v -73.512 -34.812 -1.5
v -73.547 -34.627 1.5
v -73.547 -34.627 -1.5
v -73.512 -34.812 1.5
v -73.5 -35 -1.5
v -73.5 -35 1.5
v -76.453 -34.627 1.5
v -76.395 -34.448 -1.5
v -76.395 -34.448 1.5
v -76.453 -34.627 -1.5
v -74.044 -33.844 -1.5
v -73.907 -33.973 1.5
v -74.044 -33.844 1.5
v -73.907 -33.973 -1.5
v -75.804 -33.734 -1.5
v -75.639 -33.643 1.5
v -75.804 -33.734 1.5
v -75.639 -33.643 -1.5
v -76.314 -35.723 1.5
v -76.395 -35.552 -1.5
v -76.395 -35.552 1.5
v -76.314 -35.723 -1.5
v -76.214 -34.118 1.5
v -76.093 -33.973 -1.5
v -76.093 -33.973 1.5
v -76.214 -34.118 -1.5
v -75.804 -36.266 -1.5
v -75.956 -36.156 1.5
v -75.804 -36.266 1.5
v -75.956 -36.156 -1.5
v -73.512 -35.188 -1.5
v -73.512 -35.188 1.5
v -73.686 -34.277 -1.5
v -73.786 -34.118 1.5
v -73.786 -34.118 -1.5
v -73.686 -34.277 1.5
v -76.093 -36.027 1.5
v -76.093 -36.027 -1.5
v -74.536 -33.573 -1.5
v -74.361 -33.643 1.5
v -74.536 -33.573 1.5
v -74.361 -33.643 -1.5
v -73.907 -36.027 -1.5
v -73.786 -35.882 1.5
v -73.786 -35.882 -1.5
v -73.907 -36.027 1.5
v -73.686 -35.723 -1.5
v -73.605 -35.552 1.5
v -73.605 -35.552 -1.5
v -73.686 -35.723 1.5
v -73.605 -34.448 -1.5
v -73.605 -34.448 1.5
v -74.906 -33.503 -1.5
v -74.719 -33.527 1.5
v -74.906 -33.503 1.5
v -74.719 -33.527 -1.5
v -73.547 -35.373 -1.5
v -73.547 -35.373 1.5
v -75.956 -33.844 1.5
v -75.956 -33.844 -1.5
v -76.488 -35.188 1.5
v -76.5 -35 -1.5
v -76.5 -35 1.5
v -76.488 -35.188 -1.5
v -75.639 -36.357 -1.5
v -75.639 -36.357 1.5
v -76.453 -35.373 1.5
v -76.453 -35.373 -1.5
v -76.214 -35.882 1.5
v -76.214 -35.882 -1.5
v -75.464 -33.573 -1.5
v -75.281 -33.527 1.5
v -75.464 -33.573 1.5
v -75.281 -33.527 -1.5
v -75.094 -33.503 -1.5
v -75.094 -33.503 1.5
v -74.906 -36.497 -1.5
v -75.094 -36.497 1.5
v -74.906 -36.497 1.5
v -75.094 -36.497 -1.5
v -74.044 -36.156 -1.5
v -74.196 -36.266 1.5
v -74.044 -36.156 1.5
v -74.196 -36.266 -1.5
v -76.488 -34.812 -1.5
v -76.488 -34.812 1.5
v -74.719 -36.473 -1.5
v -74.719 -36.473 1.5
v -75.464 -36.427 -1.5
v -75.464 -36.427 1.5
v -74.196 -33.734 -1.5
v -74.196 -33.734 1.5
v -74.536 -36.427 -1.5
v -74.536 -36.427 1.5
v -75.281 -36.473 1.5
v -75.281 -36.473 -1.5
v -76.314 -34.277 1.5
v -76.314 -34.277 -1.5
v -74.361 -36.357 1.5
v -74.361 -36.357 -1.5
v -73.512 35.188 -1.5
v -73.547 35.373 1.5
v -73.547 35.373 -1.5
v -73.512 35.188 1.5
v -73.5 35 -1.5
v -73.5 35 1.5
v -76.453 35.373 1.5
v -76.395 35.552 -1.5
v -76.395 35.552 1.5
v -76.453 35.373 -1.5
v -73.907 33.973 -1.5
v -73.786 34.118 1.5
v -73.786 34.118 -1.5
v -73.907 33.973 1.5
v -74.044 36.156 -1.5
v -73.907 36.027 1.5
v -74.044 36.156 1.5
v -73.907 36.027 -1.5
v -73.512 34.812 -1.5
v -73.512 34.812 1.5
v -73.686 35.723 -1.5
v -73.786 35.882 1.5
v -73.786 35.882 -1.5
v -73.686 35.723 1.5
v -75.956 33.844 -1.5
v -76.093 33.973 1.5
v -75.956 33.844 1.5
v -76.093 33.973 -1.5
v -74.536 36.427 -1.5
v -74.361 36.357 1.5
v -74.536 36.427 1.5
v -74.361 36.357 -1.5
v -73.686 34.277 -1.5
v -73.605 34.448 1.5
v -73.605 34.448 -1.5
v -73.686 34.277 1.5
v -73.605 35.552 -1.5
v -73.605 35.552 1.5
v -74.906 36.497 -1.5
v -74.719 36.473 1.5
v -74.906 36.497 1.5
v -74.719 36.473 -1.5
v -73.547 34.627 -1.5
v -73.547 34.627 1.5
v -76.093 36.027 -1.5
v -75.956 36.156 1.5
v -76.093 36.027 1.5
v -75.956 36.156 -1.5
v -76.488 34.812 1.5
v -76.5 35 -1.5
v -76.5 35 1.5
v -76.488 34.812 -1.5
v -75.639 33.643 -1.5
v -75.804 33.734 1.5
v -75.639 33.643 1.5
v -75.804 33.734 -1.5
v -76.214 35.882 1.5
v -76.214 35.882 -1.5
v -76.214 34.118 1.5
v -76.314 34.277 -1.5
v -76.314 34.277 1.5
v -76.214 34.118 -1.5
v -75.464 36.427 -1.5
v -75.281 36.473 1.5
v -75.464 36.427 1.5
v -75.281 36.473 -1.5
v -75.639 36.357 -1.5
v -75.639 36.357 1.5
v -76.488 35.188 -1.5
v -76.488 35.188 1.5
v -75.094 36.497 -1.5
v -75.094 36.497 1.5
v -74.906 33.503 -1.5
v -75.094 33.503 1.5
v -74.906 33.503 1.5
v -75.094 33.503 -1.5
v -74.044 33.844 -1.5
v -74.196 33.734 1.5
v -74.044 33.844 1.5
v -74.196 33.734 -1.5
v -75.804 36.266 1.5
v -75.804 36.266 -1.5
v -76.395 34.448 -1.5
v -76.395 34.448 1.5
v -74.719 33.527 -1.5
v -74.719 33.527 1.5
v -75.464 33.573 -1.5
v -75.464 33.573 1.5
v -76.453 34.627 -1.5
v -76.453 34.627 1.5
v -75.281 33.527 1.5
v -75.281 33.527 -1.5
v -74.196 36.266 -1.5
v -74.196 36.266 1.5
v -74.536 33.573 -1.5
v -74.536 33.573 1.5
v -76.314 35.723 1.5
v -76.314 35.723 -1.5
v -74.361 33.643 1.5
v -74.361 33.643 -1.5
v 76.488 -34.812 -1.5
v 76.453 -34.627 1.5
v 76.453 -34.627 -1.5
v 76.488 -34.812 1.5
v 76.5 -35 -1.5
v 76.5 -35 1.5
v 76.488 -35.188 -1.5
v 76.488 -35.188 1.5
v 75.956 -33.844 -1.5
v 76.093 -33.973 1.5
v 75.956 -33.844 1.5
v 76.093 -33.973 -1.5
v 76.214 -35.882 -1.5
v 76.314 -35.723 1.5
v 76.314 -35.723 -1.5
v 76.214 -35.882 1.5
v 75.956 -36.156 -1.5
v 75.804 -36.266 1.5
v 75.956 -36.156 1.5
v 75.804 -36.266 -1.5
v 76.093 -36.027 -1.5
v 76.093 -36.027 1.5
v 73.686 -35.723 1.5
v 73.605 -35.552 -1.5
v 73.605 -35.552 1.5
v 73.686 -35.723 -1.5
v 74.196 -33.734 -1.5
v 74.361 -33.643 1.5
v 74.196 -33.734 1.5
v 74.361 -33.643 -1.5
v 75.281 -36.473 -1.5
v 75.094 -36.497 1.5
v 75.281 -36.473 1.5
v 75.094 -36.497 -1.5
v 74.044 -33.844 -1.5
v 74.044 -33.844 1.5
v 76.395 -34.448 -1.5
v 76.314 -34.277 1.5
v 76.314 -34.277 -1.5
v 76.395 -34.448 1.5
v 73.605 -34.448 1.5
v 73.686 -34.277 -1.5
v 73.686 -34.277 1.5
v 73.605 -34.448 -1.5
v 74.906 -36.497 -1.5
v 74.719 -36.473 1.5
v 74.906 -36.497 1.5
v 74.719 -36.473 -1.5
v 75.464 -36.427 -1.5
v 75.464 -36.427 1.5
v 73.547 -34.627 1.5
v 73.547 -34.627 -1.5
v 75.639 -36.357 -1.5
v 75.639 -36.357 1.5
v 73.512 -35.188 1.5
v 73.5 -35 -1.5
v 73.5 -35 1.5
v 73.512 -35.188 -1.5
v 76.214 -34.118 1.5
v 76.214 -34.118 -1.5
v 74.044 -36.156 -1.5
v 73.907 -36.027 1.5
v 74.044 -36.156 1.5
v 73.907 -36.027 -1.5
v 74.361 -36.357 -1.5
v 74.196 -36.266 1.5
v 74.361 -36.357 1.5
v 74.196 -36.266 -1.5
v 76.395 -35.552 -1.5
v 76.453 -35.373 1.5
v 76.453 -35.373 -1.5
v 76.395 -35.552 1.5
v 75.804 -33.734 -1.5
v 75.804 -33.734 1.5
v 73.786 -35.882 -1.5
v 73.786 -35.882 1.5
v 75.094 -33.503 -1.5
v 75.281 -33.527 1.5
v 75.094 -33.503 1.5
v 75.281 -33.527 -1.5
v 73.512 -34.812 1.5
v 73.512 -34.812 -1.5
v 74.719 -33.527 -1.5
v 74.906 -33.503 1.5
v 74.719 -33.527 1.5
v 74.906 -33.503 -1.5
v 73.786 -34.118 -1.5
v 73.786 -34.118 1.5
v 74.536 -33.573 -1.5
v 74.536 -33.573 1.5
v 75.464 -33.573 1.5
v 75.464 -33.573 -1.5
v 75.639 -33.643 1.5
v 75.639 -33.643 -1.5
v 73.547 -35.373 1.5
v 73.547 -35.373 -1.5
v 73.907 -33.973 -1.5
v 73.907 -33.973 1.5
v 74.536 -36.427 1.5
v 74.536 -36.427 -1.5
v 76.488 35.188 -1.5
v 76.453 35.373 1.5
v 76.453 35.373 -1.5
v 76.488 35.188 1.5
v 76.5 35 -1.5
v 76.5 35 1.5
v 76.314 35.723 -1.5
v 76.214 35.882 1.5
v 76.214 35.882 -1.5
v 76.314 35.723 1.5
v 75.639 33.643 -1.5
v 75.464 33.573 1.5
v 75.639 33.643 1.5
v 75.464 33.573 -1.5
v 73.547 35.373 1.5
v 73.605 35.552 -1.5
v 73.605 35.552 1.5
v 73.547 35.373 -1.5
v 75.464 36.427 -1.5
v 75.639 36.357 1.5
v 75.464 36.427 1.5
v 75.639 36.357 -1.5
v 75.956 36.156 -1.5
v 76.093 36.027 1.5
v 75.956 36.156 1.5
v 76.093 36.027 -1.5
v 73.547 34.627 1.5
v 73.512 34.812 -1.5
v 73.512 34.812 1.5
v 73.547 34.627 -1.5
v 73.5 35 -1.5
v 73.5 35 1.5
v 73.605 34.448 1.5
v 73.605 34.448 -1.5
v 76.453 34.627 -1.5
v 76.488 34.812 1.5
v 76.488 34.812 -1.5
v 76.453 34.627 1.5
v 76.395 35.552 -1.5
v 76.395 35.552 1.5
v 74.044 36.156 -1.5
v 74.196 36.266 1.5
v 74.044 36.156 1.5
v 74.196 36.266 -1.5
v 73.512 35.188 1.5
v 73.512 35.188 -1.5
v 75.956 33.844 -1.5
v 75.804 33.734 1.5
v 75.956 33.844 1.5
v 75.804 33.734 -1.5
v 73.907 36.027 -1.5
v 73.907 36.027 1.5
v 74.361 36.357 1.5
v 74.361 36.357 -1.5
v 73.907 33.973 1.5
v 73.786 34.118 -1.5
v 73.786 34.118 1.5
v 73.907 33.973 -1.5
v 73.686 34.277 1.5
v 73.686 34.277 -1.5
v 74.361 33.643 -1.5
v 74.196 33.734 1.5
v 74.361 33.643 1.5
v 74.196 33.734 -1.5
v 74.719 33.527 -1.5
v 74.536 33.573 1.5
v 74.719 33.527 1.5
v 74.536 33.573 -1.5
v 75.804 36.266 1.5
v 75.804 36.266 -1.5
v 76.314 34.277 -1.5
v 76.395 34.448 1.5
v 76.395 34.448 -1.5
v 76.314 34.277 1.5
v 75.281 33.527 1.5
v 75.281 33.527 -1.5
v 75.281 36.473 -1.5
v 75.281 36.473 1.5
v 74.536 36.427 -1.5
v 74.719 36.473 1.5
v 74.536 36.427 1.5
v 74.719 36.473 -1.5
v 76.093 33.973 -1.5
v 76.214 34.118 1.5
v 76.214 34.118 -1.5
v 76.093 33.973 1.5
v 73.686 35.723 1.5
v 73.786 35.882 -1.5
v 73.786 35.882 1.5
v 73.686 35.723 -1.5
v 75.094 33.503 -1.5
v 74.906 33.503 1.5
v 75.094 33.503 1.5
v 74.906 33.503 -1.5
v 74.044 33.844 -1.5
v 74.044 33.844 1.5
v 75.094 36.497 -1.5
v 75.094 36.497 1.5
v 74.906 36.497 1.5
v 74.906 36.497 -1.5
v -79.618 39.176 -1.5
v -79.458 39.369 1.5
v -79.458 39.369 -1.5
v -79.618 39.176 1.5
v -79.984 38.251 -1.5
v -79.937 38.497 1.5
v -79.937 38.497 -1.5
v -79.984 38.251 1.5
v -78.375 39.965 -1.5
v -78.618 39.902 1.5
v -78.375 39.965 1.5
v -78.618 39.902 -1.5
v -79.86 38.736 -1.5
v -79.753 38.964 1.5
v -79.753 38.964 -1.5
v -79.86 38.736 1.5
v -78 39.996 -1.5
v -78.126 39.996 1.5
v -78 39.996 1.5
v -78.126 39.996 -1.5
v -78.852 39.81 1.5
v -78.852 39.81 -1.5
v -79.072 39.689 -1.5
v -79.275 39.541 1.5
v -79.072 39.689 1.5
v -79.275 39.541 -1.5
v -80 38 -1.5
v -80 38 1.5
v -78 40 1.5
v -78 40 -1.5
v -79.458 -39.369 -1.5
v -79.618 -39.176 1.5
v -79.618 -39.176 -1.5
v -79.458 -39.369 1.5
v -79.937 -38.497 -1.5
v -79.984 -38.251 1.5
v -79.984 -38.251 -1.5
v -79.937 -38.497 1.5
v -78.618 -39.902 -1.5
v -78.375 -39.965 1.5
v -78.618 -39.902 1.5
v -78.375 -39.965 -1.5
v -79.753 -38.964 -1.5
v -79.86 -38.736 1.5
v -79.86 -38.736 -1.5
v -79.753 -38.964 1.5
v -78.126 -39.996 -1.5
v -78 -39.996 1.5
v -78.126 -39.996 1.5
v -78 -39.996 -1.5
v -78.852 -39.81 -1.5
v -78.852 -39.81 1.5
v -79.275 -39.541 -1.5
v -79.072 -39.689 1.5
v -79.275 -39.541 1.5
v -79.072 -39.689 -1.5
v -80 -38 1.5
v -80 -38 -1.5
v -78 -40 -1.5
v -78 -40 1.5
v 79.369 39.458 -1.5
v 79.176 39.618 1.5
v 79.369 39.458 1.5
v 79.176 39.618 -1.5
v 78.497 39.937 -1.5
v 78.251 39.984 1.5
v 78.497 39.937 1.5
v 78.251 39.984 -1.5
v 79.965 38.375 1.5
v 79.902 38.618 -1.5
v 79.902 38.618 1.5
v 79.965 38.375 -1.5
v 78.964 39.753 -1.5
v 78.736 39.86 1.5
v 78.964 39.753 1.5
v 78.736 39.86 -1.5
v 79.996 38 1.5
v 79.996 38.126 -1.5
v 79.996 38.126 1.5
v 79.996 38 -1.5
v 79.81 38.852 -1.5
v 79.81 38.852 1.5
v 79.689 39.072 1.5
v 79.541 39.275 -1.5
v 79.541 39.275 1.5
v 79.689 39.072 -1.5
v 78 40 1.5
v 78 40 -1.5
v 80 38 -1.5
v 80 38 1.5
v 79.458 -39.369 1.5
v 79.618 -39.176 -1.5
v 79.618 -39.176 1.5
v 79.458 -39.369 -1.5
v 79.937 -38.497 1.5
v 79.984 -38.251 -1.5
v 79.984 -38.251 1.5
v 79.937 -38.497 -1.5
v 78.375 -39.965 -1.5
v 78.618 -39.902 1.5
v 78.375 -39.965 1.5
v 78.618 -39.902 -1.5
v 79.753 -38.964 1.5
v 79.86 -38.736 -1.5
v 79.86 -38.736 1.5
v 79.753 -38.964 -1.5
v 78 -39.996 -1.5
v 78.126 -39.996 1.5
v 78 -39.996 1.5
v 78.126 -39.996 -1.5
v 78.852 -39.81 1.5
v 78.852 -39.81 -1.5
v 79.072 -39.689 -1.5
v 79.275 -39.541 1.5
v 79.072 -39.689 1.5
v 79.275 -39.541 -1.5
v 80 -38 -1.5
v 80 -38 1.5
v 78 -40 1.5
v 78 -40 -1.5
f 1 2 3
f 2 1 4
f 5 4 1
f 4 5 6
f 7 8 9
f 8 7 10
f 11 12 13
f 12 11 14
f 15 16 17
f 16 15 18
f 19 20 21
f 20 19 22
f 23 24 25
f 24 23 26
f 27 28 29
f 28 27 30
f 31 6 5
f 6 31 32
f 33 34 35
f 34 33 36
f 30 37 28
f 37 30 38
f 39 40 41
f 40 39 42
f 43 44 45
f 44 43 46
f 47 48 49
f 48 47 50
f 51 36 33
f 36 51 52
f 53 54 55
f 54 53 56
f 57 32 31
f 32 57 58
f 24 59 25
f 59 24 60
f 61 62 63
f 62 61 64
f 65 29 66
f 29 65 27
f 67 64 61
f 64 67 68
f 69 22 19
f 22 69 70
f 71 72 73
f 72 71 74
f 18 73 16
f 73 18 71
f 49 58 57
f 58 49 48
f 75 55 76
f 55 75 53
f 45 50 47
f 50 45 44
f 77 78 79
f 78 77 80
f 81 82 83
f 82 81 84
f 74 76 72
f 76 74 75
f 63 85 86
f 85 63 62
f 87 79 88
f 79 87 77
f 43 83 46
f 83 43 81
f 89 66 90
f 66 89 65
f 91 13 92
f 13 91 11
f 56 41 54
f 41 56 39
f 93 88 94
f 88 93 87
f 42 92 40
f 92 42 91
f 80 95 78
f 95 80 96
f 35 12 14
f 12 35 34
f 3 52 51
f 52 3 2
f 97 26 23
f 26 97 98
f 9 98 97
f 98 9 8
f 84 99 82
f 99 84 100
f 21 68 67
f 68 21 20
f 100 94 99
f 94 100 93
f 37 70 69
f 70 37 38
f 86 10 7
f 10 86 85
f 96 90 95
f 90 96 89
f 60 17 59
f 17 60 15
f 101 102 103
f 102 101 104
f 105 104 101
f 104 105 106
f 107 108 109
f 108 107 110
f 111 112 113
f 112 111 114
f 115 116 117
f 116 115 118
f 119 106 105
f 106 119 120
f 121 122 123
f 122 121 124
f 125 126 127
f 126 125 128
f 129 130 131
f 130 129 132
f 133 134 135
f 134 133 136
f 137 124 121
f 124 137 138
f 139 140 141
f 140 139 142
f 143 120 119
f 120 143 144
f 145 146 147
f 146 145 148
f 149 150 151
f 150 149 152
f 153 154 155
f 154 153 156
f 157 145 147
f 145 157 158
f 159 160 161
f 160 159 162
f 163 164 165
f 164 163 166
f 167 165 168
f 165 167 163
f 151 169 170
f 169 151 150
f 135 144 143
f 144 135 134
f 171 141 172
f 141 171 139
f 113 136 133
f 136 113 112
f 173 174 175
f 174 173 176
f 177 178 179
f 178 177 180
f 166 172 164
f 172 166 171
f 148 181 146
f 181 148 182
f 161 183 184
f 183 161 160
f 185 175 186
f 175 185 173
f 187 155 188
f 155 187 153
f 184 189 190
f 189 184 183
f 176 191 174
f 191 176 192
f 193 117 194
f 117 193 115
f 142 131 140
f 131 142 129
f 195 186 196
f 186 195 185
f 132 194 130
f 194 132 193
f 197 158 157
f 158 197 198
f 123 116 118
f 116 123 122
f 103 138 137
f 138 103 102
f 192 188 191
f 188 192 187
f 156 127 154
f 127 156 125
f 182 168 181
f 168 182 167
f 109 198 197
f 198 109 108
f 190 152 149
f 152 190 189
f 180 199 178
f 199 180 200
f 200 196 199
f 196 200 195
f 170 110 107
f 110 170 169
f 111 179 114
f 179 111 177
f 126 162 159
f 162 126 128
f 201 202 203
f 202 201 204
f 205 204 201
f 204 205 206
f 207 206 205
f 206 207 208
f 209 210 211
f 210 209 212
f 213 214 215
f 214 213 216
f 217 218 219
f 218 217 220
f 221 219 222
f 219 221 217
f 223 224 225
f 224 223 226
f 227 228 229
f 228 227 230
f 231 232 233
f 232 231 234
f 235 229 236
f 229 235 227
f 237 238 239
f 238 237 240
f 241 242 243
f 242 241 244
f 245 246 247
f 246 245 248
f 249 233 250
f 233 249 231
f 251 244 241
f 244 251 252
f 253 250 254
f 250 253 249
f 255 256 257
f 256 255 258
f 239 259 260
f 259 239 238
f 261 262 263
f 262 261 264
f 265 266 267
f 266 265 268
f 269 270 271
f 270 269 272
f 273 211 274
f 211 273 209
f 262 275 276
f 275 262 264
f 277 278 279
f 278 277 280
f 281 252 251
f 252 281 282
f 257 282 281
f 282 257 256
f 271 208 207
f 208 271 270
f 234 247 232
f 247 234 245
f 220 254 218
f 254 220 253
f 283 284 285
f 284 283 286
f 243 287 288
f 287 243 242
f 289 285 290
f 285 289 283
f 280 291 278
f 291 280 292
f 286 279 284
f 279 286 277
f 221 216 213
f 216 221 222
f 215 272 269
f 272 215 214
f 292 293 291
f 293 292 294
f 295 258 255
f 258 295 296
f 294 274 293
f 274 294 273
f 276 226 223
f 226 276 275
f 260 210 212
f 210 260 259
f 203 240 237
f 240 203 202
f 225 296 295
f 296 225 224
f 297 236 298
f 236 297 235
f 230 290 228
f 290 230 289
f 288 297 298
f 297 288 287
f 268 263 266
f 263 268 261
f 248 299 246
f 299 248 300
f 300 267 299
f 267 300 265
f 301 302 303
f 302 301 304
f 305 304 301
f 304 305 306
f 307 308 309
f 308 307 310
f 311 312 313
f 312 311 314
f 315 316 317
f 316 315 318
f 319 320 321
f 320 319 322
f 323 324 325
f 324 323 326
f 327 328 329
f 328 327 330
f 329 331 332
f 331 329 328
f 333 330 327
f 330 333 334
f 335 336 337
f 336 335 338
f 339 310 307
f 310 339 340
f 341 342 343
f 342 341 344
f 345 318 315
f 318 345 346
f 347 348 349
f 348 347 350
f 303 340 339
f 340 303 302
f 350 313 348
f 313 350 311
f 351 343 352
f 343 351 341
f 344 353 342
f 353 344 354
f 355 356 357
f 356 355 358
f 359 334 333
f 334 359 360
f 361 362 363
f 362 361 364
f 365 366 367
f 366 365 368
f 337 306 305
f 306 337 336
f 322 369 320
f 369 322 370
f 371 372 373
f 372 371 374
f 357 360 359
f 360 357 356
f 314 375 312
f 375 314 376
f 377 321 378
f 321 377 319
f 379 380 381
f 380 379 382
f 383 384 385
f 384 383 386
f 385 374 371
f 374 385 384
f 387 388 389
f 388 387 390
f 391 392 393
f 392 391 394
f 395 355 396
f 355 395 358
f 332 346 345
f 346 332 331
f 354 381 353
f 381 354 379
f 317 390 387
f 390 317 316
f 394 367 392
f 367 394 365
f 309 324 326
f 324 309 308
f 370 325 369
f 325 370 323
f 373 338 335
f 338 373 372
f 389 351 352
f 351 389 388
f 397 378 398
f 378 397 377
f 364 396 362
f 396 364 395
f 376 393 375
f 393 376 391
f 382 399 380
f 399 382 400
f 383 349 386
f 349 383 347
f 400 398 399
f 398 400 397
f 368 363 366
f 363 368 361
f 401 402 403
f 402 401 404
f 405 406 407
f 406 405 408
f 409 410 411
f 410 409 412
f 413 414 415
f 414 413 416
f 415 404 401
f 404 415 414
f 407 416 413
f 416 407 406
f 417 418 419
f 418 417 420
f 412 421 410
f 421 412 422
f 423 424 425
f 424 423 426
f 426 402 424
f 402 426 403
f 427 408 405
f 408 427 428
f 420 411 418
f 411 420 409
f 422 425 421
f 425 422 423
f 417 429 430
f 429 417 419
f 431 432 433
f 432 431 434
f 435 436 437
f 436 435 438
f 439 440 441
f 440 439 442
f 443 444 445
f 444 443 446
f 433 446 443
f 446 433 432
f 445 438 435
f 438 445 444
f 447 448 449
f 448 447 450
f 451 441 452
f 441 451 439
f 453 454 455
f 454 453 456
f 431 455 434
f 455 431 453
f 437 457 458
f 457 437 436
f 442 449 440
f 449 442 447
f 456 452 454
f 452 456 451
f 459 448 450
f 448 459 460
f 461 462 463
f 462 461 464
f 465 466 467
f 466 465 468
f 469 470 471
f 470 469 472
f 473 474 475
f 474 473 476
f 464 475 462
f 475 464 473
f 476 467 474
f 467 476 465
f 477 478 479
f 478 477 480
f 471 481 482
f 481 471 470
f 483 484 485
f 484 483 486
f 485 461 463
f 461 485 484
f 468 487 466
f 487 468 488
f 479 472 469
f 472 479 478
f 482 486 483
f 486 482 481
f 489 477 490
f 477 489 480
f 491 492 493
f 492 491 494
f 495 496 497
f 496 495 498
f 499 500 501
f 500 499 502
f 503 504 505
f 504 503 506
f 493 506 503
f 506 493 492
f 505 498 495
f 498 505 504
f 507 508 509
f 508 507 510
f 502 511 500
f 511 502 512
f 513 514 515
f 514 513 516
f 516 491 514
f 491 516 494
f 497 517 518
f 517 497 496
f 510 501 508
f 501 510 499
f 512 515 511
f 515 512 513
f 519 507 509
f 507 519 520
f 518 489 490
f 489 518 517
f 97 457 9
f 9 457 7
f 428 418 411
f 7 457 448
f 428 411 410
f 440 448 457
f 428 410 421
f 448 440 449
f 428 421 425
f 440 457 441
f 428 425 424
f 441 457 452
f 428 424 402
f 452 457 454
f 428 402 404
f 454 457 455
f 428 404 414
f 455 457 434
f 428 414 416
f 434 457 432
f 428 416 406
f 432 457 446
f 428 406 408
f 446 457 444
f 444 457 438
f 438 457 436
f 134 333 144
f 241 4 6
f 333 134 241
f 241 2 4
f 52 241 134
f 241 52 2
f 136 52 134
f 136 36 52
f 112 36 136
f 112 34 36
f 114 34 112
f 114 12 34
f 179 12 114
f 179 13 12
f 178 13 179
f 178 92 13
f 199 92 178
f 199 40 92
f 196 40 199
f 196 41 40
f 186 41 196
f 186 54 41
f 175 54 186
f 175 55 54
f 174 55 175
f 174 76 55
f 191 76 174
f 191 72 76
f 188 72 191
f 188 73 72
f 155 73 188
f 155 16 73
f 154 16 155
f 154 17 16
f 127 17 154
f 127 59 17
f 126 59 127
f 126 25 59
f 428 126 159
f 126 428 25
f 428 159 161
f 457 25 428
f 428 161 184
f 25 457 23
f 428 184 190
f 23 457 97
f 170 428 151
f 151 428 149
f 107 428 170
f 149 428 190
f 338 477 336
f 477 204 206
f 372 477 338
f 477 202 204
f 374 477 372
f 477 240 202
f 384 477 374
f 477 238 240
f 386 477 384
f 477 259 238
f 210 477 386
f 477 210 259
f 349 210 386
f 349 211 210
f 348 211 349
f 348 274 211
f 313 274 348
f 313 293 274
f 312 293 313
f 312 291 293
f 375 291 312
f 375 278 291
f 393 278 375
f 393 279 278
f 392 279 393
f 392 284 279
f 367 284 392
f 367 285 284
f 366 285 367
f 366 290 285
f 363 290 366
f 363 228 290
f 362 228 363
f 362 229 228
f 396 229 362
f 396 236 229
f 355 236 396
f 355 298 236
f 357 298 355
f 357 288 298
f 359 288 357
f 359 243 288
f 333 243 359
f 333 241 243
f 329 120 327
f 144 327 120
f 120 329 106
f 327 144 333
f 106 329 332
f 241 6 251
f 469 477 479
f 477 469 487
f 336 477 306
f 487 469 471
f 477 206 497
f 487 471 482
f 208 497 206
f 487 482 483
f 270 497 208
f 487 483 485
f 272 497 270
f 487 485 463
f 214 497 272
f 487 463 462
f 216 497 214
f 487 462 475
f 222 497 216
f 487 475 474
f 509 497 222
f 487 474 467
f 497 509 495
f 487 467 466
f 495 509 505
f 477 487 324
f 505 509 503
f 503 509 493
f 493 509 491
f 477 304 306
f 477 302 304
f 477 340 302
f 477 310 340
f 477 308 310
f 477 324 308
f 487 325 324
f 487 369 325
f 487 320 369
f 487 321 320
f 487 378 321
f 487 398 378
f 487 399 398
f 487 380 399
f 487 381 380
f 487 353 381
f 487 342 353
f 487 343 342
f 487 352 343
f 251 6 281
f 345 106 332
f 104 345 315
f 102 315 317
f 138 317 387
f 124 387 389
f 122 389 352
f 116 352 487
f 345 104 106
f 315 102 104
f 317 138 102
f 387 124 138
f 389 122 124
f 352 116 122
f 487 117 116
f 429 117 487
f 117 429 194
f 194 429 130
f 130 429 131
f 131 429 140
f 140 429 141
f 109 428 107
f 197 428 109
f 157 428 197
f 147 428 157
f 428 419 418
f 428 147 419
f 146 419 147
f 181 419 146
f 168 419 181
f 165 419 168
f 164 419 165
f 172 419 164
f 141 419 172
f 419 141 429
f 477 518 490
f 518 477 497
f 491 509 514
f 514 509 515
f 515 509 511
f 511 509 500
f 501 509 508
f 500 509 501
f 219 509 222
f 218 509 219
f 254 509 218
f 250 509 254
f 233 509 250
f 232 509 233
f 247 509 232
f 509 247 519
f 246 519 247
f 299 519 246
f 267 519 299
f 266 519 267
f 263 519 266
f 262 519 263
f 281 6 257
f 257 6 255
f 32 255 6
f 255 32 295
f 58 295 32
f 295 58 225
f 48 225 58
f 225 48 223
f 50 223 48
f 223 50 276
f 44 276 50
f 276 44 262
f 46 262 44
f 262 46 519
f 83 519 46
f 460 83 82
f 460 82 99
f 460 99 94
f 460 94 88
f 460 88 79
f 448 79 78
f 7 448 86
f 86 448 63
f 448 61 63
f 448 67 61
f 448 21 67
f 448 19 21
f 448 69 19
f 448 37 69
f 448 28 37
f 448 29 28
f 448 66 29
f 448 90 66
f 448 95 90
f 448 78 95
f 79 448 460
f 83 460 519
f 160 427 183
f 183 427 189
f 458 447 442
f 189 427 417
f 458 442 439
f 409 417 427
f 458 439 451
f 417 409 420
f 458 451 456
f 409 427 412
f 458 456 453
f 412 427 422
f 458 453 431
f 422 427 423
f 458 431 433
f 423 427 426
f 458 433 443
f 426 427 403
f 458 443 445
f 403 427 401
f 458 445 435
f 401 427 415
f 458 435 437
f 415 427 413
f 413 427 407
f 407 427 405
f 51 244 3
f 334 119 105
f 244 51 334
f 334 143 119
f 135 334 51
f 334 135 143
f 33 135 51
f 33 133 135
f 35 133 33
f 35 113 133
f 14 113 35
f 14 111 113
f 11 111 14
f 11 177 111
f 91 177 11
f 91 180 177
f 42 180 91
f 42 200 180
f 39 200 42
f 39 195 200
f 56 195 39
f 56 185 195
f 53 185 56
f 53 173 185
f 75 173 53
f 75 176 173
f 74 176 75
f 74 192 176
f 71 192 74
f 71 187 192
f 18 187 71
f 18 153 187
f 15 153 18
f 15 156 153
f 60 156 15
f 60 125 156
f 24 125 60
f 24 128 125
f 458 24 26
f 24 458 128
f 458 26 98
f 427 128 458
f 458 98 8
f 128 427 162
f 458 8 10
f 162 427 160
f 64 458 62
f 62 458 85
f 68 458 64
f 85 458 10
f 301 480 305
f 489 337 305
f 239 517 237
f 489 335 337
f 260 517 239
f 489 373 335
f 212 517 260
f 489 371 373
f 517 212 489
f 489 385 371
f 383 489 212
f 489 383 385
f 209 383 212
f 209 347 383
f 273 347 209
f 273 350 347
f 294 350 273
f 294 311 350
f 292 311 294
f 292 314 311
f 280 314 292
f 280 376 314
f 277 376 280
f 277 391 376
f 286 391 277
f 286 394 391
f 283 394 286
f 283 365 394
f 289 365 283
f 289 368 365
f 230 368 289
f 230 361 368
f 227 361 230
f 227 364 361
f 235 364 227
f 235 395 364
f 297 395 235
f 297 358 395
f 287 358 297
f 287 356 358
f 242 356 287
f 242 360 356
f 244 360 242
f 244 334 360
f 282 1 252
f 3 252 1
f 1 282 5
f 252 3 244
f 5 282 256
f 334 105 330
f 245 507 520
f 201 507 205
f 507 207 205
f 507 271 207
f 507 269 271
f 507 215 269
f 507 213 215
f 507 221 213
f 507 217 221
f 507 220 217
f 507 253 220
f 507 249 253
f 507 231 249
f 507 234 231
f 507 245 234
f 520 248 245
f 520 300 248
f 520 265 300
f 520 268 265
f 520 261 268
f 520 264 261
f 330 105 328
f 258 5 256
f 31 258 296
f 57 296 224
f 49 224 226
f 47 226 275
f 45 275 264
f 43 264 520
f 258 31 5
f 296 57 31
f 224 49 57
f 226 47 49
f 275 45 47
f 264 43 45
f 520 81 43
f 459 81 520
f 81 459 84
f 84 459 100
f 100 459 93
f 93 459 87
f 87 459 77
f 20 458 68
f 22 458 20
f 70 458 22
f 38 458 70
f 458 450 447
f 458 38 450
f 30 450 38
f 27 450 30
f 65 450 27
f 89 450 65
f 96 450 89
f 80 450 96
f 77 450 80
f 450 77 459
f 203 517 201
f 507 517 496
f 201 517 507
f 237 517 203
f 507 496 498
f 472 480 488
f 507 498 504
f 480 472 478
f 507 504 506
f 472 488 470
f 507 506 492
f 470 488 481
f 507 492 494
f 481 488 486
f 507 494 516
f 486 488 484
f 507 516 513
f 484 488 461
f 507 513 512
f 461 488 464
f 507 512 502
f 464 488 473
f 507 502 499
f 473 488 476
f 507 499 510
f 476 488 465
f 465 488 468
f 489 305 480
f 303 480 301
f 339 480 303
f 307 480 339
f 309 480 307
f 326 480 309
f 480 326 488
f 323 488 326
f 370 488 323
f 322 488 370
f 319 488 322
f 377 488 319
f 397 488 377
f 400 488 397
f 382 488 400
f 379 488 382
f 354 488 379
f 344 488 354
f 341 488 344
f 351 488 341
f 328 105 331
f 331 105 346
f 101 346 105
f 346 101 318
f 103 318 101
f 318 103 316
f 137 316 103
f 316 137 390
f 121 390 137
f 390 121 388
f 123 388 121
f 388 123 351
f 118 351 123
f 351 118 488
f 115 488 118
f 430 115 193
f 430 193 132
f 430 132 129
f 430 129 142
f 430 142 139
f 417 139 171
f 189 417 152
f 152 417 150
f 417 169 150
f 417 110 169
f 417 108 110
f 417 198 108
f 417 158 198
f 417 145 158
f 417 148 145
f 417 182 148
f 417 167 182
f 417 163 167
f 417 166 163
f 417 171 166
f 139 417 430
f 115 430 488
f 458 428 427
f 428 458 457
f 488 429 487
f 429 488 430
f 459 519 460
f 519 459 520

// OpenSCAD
// file: ../LIB/round_corner_mask.scad
// Copyright (c) 2014 Jérémie DECOCK <jd.jdhp@gmail.com>

module round_corner_mask(radius, spacing_x, spacing_y, height) {
	$fn=50;
	
    difference() {
        cube([2*radius+1, 2*radius+1, height], center=true);
        union() {
            cylinder(r=radius, h=height+2, center=true);
            translate([(radius+2)/2, 0, 0]) cube([radius+2, 2*radius+2, height+2], center=true);
            translate([0, (radius+2)/2, 0]) cube([2*radius+2, radius+2, height+2], center=true);
        }
    }
}

module board_round_4_corner_mask(radius, width, depth, height) {
    spacing_x = width - 2 * radius;
    spacing_y = depth - 2 * radius;
    height = height + 1;

    translate([-spacing_x/2,  spacing_y/2, 0]) mirror([0,1,0]) round_corner_mask(radius, spacing_x, spacing_y, height);
    translate([-spacing_x/2, -spacing_y/2, 0]) mirror([0,0,0]) round_corner_mask(radius, spacing_x, spacing_y, height);
    translate([ spacing_x/2,  spacing_y/2, 0]) mirror([1,1,0]) round_corner_mask(radius, spacing_x, spacing_y, height);
    translate([ spacing_x/2, -spacing_y/2, 0]) mirror([1,0,0]) round_corner_mask(radius, spacing_x, spacing_y, height);
}
// file: ../LIB/four_screw_holes.scad
// Copyright (c) 2014 Jérémie DECOCK <jd.jdhp@gmail.com>

/////////////////////////////////////////////

module four_screw_holes(radius, spacing_x, spacing_y, height) {
	for (i = [-1, 1]) {    
        for (j = [-1, 1]) {    
            translate([i*spacing_x/2, j*spacing_y/2, 0]) {        
                cylinder(r=radius, h=height, center=true, $fn=50);
            }
        }
	}
}
// file: empty_board.scad
// 2 wheel robot for Raspberry Pi (model B).

// Copyright (c) 2014 Jérémie DECOCK <jd.jdhp@gmail.com>

use <../LIB/four_screw_holes.scad>
use <../LIB/round_corner_mask.scad>

/////////////////////////////////////////////

module empty_board() {

    screw_holes_radius = 1.5;
    screw_holes_spacing_x = 150;
    screw_holes_spacing_y = 70;
    board_height = 3;
    board_corner_radius = 2;
    board_width = screw_holes_spacing_x + 10;
    board_depth = screw_holes_spacing_y + 10;

    difference() {
        cube([board_width, board_depth, board_height], center=true);
        #four_screw_holes(screw_holes_radius, screw_holes_spacing_x, screw_holes_spacing_y, board_height+1);
        #board_round_4_corner_mask(radius=board_corner_radius, width=board_width, depth=board_depth, height=board_height);
    }
}
// main file
// 2 wheel robot for Raspberry Pi (model B).

// Copyright (c) 2014 Jérémie DECOCK <jd.jdhp@gmail.com>

use <empty_board.scad>

/////////////////////////////////////////////

module batteries_and_motors_board() {
    empty_board();
}

batteries_and_motors_board();
